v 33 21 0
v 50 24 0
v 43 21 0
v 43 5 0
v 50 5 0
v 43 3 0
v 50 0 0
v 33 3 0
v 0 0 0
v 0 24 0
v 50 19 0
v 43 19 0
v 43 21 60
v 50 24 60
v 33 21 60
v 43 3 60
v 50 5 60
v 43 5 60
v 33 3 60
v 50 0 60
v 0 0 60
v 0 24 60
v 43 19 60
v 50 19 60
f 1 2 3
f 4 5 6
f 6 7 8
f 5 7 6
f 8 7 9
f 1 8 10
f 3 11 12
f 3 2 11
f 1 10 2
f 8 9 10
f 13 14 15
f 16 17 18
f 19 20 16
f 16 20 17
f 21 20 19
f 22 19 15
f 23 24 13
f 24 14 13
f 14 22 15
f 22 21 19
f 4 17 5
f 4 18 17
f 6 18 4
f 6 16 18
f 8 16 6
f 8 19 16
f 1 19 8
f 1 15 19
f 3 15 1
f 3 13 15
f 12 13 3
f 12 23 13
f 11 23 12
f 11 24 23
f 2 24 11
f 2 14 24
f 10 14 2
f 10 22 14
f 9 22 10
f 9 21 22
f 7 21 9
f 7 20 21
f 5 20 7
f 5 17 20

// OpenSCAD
$fn = 32;

// ----------------------------------------------------------------------
// T-slot rail: 50 x 24 mm section, 60 mm long
// ----------------------------------------------------------------------

// --- parameters (mm) ---
profile_height = 60;      // extrusion height
profile_points = 12;      // points of the closed outline

profile = [[0, 0], [50, 0], [50, 5], [43, 5], [43, 3], [33, 3], [33, 21], [43, 21], [43, 19], [50, 19], [50, 24], [0, 24]];  // single closed polygon, 12 points, counter clockwise

// --- the one profile operation ---
linear_extrude(height = profile_height) polygon(points = profile);
